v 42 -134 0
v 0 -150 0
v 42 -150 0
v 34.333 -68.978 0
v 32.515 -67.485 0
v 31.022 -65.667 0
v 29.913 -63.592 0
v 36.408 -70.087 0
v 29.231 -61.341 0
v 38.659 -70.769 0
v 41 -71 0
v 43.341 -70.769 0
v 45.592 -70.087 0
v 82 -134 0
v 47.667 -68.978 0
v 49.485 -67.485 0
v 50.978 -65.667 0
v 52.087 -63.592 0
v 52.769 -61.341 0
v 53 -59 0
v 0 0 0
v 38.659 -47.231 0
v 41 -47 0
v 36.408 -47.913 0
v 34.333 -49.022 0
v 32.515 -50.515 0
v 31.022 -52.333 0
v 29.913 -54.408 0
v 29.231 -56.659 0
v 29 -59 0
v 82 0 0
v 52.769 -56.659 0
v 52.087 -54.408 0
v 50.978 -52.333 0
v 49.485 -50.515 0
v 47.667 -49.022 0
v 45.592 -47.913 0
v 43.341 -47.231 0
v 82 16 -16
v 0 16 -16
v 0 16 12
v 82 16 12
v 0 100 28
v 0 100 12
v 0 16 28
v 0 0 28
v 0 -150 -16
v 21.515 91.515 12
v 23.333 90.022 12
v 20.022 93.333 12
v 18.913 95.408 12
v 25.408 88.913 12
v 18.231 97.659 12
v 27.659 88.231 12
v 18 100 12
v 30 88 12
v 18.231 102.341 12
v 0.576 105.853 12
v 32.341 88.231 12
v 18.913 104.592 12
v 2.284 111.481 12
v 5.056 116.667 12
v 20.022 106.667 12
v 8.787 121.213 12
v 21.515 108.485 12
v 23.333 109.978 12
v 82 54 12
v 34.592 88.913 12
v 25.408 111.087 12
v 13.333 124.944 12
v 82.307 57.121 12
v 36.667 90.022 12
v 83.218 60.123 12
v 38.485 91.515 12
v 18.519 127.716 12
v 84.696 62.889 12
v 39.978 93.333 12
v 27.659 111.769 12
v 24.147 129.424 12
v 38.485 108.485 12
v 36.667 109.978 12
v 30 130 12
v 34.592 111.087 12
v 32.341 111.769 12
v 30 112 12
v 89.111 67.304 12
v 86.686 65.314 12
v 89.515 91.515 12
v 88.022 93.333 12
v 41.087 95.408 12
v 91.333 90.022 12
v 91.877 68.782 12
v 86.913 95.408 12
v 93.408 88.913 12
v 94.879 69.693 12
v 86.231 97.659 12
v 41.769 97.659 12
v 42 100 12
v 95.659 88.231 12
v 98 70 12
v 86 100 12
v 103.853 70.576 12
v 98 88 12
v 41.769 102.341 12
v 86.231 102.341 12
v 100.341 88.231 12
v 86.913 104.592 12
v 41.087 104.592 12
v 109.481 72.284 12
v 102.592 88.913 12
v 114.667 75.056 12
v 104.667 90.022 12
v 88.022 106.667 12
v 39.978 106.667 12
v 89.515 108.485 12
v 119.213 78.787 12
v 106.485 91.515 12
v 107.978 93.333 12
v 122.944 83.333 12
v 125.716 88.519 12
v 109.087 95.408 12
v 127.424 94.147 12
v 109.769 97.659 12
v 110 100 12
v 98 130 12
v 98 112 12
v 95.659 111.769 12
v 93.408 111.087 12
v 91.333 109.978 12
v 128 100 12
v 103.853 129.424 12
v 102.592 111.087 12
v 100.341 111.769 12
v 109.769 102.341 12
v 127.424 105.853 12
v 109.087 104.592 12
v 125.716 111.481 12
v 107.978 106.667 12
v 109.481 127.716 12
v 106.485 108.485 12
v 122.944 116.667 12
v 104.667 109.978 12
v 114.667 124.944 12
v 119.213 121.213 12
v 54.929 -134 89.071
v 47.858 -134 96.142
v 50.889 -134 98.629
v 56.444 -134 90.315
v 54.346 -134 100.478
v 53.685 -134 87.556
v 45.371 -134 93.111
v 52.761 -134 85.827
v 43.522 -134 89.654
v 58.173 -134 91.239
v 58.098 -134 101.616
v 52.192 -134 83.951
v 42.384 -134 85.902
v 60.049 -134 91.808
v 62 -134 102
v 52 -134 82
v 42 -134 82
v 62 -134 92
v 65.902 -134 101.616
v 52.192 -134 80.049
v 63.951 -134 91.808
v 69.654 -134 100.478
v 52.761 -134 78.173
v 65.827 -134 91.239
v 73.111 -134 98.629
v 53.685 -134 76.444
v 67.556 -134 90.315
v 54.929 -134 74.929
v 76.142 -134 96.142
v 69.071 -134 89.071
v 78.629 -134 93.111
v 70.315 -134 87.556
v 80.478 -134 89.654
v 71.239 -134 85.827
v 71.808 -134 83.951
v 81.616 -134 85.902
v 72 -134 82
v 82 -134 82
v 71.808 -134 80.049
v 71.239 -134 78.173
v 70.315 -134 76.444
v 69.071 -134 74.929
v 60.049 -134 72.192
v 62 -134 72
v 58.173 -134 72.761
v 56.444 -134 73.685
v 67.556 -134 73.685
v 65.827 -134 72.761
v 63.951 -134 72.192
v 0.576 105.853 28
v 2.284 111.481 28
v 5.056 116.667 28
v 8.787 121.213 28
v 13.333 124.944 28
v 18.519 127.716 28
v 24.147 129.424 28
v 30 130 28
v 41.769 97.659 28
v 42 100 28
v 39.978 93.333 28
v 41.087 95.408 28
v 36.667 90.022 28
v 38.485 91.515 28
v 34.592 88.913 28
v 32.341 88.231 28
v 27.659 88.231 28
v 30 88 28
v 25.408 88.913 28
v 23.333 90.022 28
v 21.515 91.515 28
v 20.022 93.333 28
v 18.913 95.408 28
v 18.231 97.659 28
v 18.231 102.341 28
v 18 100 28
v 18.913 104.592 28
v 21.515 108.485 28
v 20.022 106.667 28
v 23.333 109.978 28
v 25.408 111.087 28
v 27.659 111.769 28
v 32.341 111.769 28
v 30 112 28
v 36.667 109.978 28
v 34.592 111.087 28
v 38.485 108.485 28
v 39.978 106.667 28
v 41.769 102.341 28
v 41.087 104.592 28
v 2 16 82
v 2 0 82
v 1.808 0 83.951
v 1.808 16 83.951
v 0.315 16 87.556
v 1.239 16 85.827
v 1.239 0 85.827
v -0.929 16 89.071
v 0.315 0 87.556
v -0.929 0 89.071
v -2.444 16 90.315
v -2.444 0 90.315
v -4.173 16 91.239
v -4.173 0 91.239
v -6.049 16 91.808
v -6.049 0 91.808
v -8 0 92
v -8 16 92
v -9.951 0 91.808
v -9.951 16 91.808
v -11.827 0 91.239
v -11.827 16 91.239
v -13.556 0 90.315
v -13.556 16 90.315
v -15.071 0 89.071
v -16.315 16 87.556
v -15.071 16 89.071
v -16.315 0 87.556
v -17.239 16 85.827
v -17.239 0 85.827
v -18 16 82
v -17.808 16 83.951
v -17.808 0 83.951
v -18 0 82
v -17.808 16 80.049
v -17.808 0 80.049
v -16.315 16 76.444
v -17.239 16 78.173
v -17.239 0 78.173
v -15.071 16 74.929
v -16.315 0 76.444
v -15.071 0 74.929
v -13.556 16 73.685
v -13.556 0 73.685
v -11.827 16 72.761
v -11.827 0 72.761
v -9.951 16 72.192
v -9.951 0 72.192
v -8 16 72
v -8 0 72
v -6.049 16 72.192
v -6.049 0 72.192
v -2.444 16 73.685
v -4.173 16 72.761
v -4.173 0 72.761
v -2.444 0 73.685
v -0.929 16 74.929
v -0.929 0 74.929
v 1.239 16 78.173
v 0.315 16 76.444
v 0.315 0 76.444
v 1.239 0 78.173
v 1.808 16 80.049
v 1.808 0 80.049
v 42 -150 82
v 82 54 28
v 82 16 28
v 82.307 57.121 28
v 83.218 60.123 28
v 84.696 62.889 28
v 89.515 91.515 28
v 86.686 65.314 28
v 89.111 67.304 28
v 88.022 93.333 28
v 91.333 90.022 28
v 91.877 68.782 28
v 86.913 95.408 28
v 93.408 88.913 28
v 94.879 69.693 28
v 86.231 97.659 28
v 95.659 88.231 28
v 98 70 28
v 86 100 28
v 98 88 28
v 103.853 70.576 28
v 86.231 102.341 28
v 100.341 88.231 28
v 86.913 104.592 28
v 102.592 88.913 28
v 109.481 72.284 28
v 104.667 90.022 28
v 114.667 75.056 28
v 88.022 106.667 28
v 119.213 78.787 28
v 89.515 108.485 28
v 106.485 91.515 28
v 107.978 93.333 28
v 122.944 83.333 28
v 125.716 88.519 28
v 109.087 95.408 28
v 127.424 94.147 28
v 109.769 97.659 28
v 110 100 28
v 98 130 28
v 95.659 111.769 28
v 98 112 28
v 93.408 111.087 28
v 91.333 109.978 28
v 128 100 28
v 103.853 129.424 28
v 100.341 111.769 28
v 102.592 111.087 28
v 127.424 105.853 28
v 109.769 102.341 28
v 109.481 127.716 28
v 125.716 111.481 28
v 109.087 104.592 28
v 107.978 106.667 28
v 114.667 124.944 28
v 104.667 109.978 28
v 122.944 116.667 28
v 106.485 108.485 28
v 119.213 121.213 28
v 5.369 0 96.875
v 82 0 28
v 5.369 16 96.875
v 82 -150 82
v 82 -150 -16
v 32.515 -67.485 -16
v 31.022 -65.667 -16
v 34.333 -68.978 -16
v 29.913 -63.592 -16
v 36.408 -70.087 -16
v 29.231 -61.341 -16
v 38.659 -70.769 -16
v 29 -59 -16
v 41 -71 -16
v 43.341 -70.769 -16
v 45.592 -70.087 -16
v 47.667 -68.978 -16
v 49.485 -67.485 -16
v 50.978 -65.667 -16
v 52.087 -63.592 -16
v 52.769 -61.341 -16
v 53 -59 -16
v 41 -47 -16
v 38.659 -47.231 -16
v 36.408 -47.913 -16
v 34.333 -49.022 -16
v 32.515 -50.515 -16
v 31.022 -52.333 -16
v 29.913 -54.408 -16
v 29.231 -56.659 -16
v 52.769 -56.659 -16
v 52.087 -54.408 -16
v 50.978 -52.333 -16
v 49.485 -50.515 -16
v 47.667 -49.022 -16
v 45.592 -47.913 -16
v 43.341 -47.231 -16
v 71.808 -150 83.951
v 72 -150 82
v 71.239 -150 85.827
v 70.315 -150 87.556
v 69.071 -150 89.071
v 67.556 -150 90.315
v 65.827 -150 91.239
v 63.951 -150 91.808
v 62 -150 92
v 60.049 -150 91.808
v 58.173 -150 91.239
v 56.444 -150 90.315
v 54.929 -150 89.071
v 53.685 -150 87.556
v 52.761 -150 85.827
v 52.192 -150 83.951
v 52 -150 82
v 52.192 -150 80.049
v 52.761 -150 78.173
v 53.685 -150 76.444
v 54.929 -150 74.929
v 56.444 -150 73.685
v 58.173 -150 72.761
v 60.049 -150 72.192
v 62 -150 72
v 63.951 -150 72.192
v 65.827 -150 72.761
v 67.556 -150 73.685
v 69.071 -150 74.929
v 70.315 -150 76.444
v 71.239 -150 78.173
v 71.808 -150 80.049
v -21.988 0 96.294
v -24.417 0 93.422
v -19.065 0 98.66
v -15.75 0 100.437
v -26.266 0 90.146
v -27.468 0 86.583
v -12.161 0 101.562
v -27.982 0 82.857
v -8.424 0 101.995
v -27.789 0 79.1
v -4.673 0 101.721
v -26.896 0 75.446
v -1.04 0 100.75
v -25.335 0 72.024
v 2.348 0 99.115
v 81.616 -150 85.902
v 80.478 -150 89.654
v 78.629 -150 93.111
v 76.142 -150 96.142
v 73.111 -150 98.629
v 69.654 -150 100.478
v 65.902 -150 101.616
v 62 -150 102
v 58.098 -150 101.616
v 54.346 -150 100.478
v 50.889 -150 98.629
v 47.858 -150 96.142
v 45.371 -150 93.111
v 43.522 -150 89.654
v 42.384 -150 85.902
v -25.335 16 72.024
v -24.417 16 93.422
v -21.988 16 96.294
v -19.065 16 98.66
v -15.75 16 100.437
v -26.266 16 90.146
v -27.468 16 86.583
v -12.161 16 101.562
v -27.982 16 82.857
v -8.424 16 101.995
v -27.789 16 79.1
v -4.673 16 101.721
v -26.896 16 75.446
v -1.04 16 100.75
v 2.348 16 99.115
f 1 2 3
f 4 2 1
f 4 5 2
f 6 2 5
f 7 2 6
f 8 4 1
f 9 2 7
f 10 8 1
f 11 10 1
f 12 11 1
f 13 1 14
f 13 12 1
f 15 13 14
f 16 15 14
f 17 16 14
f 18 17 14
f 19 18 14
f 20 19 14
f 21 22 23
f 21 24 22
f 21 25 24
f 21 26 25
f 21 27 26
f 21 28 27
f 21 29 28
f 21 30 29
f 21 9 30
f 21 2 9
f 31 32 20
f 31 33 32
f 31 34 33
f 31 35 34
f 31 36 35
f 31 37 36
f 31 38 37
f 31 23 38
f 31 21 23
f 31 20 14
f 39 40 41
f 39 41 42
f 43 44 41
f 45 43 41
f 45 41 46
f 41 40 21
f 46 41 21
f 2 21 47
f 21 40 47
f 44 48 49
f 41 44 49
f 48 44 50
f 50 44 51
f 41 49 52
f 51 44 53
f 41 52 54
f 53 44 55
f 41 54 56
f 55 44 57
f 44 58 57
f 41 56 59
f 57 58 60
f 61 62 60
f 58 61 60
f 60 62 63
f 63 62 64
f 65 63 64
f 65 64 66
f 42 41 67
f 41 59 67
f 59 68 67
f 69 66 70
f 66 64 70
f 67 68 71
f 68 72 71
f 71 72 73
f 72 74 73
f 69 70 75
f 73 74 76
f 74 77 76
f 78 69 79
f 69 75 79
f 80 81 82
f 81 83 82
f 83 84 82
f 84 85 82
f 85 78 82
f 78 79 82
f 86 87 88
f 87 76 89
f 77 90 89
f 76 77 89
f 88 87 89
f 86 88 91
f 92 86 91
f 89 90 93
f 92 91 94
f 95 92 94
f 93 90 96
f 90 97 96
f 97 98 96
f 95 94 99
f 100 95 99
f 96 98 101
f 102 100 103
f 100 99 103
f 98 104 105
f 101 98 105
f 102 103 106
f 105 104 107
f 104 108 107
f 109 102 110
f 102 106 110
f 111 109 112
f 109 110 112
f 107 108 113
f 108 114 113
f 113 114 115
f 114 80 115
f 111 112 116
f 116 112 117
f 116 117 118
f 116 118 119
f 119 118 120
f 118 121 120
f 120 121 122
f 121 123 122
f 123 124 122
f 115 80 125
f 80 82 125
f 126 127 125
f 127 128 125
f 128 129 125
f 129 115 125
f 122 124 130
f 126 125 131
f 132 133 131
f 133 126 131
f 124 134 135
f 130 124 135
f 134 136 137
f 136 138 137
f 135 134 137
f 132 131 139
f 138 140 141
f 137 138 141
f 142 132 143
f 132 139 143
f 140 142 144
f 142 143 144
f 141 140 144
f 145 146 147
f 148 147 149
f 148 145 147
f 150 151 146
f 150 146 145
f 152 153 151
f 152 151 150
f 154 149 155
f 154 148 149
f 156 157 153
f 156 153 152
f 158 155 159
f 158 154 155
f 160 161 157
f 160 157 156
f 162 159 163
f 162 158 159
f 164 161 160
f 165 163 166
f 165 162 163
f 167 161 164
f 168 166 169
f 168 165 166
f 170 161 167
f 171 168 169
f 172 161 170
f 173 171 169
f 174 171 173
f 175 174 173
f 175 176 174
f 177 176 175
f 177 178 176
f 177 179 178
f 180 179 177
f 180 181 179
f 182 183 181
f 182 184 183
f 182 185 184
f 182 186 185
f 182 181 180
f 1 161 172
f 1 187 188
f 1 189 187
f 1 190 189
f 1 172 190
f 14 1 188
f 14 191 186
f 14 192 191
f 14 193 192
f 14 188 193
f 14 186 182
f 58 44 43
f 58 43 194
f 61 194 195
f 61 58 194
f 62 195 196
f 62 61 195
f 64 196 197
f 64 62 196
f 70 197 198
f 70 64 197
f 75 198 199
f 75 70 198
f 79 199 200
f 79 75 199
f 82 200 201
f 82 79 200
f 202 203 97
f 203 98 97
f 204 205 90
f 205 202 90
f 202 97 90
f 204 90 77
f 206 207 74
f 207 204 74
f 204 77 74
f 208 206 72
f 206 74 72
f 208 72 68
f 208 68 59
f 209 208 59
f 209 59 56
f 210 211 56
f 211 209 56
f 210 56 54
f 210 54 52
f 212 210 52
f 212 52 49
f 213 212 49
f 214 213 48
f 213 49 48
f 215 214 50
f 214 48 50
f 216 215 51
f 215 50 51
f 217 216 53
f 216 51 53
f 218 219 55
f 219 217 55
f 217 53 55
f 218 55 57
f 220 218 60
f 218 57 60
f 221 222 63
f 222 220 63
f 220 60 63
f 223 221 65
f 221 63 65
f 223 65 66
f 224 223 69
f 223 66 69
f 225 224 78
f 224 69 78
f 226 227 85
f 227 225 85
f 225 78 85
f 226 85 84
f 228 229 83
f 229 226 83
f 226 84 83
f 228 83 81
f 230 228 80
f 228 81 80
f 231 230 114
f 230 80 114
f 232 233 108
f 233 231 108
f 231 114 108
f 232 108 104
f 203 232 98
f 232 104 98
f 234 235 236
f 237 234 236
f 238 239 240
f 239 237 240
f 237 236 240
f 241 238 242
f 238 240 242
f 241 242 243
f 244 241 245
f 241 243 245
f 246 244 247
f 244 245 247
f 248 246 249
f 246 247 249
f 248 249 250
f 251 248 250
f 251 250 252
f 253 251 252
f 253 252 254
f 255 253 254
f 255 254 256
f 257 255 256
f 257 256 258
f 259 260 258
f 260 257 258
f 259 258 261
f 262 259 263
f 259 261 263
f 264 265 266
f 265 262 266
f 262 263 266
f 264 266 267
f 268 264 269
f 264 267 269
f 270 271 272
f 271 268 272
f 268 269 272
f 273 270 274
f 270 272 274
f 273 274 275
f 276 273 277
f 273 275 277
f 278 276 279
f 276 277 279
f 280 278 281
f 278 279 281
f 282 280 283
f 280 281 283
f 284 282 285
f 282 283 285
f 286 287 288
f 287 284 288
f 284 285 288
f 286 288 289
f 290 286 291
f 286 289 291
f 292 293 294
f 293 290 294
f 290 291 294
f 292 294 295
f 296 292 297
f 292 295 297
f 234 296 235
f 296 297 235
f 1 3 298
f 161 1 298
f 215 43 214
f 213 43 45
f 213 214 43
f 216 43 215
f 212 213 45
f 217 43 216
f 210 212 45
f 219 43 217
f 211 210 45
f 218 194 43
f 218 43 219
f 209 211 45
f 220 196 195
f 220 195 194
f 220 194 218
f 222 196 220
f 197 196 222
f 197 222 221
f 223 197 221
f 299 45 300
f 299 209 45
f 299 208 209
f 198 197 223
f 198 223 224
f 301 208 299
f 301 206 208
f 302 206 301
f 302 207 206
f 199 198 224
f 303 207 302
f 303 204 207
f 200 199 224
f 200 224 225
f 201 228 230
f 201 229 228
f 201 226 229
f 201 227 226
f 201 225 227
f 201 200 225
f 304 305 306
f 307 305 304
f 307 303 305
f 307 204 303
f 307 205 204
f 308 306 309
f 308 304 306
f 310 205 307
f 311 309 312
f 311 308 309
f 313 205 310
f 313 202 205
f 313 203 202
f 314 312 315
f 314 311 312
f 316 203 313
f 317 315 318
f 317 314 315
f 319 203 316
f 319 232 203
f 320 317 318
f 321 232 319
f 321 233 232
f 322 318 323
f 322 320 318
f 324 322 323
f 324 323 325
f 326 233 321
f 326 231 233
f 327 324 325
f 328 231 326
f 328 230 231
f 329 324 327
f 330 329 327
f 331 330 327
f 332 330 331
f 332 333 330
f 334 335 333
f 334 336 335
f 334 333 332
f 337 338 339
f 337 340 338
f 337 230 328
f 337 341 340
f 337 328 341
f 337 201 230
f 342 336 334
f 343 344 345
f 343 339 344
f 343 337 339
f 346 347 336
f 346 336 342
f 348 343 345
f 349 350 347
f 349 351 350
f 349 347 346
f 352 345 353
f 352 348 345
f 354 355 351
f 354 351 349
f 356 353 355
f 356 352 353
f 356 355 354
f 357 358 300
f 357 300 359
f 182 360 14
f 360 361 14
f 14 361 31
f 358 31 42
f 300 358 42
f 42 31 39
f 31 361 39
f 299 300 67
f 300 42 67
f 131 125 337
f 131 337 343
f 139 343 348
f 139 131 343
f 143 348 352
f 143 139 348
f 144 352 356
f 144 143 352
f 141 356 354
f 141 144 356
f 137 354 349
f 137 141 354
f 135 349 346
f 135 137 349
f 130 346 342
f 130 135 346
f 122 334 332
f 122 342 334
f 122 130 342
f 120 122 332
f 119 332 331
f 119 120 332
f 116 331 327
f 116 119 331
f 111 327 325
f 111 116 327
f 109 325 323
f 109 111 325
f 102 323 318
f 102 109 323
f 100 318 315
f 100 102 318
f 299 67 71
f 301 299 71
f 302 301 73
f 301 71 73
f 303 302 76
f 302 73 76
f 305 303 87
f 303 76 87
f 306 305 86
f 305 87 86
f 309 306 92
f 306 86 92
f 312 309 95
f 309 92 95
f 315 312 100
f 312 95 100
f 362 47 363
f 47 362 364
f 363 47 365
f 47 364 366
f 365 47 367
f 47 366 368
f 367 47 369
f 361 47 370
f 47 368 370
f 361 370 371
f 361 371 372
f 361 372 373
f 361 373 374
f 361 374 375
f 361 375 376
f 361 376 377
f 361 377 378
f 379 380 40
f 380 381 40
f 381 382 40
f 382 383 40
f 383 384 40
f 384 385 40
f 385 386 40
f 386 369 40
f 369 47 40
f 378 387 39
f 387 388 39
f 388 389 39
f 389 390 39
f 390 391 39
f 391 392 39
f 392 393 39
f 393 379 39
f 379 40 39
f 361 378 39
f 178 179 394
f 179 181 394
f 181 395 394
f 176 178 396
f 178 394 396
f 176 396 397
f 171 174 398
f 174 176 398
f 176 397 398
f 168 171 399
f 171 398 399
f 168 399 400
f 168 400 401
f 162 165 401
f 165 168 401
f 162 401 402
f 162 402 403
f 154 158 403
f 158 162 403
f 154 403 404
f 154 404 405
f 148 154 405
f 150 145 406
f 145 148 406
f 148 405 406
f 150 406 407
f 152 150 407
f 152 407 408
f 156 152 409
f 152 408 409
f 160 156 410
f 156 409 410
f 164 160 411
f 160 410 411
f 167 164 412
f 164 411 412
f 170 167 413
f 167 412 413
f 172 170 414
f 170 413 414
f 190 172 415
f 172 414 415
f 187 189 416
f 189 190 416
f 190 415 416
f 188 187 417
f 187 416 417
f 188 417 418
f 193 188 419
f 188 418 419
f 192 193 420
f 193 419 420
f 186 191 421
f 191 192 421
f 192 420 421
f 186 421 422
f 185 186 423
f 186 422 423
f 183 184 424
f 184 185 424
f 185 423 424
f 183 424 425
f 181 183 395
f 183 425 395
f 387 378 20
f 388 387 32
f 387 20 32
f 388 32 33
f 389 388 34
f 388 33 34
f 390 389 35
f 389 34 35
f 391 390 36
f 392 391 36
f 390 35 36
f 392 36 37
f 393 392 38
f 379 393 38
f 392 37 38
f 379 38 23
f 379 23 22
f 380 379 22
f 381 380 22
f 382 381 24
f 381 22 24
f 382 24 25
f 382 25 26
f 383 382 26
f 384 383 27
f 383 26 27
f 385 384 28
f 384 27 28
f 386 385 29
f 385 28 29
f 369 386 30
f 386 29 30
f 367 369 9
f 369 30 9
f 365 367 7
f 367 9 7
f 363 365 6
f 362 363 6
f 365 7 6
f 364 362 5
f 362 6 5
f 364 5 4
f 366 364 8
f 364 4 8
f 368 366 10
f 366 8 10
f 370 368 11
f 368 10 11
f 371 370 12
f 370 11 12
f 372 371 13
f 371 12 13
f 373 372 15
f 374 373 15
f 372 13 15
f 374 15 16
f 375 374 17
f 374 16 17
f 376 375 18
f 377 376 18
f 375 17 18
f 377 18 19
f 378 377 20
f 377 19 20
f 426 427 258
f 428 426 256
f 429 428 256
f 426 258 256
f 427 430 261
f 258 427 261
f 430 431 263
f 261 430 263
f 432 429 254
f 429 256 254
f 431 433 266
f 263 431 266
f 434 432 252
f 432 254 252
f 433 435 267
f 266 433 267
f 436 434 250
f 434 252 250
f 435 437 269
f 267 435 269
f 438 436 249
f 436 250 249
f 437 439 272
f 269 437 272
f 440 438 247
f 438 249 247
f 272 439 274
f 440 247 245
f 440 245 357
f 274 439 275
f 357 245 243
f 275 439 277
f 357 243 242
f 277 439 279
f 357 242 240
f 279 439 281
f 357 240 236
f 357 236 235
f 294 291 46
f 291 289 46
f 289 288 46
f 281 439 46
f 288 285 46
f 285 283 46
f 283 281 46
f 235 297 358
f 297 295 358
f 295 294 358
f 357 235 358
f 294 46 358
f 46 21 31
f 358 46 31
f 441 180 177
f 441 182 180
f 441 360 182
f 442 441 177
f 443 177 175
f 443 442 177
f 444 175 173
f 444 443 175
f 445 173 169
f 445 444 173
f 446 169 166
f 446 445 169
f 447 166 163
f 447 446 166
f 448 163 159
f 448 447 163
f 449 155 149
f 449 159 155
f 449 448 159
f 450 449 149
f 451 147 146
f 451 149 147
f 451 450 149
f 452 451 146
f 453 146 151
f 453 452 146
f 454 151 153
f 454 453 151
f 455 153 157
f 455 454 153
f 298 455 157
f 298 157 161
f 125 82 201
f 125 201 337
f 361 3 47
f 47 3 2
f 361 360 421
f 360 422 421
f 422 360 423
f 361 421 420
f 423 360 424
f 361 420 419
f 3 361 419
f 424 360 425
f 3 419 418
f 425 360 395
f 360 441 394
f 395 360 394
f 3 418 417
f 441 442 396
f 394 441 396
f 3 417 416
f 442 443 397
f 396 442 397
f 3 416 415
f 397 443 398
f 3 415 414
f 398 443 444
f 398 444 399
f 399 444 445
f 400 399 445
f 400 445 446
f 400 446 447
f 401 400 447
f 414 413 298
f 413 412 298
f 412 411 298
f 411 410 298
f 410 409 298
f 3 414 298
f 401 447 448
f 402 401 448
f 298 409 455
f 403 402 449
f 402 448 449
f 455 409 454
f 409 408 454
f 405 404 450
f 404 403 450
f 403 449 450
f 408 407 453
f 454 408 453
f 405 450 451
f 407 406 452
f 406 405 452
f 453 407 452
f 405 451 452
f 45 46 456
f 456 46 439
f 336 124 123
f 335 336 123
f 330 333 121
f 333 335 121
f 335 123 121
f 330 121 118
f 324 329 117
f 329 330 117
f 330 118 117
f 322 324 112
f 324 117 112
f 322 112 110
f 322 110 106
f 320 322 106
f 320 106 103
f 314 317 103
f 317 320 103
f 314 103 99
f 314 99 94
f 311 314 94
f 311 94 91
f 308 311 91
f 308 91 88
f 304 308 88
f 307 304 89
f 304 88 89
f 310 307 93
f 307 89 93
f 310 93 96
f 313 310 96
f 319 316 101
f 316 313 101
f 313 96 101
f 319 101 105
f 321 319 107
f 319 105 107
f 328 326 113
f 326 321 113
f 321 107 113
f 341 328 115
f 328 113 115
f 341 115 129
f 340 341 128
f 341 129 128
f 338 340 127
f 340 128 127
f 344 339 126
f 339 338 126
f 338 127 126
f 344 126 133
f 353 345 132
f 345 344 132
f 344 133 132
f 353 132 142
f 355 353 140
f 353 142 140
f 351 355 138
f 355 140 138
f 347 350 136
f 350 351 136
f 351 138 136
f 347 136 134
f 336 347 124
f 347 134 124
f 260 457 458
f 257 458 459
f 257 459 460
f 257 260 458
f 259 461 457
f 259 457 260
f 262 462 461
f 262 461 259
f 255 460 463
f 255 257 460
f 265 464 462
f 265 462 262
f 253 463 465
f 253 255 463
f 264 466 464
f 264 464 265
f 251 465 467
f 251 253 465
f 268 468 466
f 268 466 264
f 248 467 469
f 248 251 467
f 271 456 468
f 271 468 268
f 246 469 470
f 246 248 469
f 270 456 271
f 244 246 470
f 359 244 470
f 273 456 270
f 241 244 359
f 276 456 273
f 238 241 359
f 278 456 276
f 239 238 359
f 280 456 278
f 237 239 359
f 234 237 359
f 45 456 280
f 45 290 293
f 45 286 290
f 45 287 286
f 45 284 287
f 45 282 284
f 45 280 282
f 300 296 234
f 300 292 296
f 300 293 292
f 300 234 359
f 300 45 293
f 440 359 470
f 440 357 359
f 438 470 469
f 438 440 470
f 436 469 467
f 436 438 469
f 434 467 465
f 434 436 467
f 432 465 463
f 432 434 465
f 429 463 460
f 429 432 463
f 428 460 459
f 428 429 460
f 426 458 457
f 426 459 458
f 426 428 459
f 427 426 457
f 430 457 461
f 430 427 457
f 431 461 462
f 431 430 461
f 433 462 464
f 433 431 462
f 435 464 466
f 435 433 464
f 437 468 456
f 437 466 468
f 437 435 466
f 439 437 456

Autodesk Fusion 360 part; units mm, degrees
sketch "Sketch1" plane through (0, 0, 0) normal (0, 0, 1) x (1, 0, 0)
  line L0 (0, 0) -> (82, 0)
  line L1 (82, 0) -> (82, -150)
  line L2 (82, -150) -> (0, -150)
  line L3 (0, -150) -> (0, 0)
  line L4 (0, 0) -> (82, 0)
  line L5 (82, 0) -> (82, 100) construction
  line L6 (82, 100) -> (0, 100) construction
  line L7 (0, 100) -> (0, 0)
  line L8 (0, 16) -> (82, 16)
  line L9 (82, 0) -> (82, 16)
  circle A0 centre (30, 100) radius 12
  circle A1 centre (98, 100) radius 12
  line L10 (30, 130) -> (98, 130)
  line L11 (82, 16) -> (82, 54)
  arc A2 (98, 70) -> (82, 54) centre (98, 54) ccw
  arc A3 (98, 70) -> (98, 130) centre (98, 100) ccw
  arc A4 (30, 130) -> (0, 100) centre (30, 100) ccw
  circle A5 centre (41, -59) radius 12
  dimension "d1" = 150
  dimension "d2" = 82
  dimension "d3" = 82
  dimension "d4" = 100
  dimension "d5" = 16
  dimension "d6" = 24
  dimension "d7" = 24
  dimension "d8" = 30
  dimension "d9" = 98
  dimension "d10" = 60
  dimension "d11" = 60
  dimension "d12" = 32
  dimension "d23" = 24
  dimension "d24" = 41
  dimension "d25" = 59
sketch "Sketch2" plane through (0, 0, 0) normal (0, 1, 0) x (1, 0, 0)
  line L0 (42, -82) -> (82, -82) construction
  line L1 (82, -82) -> (82, 0)
  line L2 (82, 0) -> (42, 0)
  line L3 (42, 0) -> (42, -82)
  circle A0 centre (-8, -82) radius 10
  circle A1 centre (62, -82) radius 10
  line L4 (0, -28) -> (82, -28)
  line L5 (0, -28) -> (-25.3346, -72.0245)
  line L6 (82, -28) -> (5.3693, -96.8748)
  arc A2 (-25.3346, -72.0245) -> (5.3693, -96.8748) centre (-8, -82) ccw
  arc A3 (42, -82) -> (82, -82) centre (62, -82) ccw
  dimension "d26" = 42
  dimension "d27" = 82
  dimension "d28" = 82
  dimension "d29" = 82
  dimension "d30" = 20
  dimension "d31" = 62
  dimension "d32" = 20
  dimension "d33" = 40
  dimension "d34" = 82
  dimension "d35" = 82
  dimension "d36" = 28
  dimension "d38" = 82
  dimension "d39" = 8
extrude "Extrude1" add sketch "Sketch1" against normal blind 16 contours L0 L1 L2 L3 L4
extrude "Extrude2" add sketch "Sketch1" along normal blind 28 and the other way up to surface (16 mm away) contours L0 L4 L7 L8 L9
extrude "Extrude3" add sketch "Sketch1" along normal blind 16 from surface at 12 contours L7 L8 L10 L11 A2 A3 A4
extrude "Extrude5" add sketch "Sketch2" along normal blind 16 from surface at -150 contours L1 L3 L6 A3 | L1 L2 L3 L4 | L3 L4 L6
extrude "Extrude6" add sketch "Sketch2" along normal blind 16 contours L3 L4 L6 | L3 L4 L5 L6 A2
equation "d3 = d2"
equation "d4 = 84 mm + 16 mm"
equation "d9 = d8 + 68 mm"
equation "d25 = 150 mm - 16 mm - 16 mm - 59 mm"
equation "d31 = 42 mm + ( 82 - 42 ) / 2 * 1 mm"
equation "d45 = 28 mm - 16 mm"
